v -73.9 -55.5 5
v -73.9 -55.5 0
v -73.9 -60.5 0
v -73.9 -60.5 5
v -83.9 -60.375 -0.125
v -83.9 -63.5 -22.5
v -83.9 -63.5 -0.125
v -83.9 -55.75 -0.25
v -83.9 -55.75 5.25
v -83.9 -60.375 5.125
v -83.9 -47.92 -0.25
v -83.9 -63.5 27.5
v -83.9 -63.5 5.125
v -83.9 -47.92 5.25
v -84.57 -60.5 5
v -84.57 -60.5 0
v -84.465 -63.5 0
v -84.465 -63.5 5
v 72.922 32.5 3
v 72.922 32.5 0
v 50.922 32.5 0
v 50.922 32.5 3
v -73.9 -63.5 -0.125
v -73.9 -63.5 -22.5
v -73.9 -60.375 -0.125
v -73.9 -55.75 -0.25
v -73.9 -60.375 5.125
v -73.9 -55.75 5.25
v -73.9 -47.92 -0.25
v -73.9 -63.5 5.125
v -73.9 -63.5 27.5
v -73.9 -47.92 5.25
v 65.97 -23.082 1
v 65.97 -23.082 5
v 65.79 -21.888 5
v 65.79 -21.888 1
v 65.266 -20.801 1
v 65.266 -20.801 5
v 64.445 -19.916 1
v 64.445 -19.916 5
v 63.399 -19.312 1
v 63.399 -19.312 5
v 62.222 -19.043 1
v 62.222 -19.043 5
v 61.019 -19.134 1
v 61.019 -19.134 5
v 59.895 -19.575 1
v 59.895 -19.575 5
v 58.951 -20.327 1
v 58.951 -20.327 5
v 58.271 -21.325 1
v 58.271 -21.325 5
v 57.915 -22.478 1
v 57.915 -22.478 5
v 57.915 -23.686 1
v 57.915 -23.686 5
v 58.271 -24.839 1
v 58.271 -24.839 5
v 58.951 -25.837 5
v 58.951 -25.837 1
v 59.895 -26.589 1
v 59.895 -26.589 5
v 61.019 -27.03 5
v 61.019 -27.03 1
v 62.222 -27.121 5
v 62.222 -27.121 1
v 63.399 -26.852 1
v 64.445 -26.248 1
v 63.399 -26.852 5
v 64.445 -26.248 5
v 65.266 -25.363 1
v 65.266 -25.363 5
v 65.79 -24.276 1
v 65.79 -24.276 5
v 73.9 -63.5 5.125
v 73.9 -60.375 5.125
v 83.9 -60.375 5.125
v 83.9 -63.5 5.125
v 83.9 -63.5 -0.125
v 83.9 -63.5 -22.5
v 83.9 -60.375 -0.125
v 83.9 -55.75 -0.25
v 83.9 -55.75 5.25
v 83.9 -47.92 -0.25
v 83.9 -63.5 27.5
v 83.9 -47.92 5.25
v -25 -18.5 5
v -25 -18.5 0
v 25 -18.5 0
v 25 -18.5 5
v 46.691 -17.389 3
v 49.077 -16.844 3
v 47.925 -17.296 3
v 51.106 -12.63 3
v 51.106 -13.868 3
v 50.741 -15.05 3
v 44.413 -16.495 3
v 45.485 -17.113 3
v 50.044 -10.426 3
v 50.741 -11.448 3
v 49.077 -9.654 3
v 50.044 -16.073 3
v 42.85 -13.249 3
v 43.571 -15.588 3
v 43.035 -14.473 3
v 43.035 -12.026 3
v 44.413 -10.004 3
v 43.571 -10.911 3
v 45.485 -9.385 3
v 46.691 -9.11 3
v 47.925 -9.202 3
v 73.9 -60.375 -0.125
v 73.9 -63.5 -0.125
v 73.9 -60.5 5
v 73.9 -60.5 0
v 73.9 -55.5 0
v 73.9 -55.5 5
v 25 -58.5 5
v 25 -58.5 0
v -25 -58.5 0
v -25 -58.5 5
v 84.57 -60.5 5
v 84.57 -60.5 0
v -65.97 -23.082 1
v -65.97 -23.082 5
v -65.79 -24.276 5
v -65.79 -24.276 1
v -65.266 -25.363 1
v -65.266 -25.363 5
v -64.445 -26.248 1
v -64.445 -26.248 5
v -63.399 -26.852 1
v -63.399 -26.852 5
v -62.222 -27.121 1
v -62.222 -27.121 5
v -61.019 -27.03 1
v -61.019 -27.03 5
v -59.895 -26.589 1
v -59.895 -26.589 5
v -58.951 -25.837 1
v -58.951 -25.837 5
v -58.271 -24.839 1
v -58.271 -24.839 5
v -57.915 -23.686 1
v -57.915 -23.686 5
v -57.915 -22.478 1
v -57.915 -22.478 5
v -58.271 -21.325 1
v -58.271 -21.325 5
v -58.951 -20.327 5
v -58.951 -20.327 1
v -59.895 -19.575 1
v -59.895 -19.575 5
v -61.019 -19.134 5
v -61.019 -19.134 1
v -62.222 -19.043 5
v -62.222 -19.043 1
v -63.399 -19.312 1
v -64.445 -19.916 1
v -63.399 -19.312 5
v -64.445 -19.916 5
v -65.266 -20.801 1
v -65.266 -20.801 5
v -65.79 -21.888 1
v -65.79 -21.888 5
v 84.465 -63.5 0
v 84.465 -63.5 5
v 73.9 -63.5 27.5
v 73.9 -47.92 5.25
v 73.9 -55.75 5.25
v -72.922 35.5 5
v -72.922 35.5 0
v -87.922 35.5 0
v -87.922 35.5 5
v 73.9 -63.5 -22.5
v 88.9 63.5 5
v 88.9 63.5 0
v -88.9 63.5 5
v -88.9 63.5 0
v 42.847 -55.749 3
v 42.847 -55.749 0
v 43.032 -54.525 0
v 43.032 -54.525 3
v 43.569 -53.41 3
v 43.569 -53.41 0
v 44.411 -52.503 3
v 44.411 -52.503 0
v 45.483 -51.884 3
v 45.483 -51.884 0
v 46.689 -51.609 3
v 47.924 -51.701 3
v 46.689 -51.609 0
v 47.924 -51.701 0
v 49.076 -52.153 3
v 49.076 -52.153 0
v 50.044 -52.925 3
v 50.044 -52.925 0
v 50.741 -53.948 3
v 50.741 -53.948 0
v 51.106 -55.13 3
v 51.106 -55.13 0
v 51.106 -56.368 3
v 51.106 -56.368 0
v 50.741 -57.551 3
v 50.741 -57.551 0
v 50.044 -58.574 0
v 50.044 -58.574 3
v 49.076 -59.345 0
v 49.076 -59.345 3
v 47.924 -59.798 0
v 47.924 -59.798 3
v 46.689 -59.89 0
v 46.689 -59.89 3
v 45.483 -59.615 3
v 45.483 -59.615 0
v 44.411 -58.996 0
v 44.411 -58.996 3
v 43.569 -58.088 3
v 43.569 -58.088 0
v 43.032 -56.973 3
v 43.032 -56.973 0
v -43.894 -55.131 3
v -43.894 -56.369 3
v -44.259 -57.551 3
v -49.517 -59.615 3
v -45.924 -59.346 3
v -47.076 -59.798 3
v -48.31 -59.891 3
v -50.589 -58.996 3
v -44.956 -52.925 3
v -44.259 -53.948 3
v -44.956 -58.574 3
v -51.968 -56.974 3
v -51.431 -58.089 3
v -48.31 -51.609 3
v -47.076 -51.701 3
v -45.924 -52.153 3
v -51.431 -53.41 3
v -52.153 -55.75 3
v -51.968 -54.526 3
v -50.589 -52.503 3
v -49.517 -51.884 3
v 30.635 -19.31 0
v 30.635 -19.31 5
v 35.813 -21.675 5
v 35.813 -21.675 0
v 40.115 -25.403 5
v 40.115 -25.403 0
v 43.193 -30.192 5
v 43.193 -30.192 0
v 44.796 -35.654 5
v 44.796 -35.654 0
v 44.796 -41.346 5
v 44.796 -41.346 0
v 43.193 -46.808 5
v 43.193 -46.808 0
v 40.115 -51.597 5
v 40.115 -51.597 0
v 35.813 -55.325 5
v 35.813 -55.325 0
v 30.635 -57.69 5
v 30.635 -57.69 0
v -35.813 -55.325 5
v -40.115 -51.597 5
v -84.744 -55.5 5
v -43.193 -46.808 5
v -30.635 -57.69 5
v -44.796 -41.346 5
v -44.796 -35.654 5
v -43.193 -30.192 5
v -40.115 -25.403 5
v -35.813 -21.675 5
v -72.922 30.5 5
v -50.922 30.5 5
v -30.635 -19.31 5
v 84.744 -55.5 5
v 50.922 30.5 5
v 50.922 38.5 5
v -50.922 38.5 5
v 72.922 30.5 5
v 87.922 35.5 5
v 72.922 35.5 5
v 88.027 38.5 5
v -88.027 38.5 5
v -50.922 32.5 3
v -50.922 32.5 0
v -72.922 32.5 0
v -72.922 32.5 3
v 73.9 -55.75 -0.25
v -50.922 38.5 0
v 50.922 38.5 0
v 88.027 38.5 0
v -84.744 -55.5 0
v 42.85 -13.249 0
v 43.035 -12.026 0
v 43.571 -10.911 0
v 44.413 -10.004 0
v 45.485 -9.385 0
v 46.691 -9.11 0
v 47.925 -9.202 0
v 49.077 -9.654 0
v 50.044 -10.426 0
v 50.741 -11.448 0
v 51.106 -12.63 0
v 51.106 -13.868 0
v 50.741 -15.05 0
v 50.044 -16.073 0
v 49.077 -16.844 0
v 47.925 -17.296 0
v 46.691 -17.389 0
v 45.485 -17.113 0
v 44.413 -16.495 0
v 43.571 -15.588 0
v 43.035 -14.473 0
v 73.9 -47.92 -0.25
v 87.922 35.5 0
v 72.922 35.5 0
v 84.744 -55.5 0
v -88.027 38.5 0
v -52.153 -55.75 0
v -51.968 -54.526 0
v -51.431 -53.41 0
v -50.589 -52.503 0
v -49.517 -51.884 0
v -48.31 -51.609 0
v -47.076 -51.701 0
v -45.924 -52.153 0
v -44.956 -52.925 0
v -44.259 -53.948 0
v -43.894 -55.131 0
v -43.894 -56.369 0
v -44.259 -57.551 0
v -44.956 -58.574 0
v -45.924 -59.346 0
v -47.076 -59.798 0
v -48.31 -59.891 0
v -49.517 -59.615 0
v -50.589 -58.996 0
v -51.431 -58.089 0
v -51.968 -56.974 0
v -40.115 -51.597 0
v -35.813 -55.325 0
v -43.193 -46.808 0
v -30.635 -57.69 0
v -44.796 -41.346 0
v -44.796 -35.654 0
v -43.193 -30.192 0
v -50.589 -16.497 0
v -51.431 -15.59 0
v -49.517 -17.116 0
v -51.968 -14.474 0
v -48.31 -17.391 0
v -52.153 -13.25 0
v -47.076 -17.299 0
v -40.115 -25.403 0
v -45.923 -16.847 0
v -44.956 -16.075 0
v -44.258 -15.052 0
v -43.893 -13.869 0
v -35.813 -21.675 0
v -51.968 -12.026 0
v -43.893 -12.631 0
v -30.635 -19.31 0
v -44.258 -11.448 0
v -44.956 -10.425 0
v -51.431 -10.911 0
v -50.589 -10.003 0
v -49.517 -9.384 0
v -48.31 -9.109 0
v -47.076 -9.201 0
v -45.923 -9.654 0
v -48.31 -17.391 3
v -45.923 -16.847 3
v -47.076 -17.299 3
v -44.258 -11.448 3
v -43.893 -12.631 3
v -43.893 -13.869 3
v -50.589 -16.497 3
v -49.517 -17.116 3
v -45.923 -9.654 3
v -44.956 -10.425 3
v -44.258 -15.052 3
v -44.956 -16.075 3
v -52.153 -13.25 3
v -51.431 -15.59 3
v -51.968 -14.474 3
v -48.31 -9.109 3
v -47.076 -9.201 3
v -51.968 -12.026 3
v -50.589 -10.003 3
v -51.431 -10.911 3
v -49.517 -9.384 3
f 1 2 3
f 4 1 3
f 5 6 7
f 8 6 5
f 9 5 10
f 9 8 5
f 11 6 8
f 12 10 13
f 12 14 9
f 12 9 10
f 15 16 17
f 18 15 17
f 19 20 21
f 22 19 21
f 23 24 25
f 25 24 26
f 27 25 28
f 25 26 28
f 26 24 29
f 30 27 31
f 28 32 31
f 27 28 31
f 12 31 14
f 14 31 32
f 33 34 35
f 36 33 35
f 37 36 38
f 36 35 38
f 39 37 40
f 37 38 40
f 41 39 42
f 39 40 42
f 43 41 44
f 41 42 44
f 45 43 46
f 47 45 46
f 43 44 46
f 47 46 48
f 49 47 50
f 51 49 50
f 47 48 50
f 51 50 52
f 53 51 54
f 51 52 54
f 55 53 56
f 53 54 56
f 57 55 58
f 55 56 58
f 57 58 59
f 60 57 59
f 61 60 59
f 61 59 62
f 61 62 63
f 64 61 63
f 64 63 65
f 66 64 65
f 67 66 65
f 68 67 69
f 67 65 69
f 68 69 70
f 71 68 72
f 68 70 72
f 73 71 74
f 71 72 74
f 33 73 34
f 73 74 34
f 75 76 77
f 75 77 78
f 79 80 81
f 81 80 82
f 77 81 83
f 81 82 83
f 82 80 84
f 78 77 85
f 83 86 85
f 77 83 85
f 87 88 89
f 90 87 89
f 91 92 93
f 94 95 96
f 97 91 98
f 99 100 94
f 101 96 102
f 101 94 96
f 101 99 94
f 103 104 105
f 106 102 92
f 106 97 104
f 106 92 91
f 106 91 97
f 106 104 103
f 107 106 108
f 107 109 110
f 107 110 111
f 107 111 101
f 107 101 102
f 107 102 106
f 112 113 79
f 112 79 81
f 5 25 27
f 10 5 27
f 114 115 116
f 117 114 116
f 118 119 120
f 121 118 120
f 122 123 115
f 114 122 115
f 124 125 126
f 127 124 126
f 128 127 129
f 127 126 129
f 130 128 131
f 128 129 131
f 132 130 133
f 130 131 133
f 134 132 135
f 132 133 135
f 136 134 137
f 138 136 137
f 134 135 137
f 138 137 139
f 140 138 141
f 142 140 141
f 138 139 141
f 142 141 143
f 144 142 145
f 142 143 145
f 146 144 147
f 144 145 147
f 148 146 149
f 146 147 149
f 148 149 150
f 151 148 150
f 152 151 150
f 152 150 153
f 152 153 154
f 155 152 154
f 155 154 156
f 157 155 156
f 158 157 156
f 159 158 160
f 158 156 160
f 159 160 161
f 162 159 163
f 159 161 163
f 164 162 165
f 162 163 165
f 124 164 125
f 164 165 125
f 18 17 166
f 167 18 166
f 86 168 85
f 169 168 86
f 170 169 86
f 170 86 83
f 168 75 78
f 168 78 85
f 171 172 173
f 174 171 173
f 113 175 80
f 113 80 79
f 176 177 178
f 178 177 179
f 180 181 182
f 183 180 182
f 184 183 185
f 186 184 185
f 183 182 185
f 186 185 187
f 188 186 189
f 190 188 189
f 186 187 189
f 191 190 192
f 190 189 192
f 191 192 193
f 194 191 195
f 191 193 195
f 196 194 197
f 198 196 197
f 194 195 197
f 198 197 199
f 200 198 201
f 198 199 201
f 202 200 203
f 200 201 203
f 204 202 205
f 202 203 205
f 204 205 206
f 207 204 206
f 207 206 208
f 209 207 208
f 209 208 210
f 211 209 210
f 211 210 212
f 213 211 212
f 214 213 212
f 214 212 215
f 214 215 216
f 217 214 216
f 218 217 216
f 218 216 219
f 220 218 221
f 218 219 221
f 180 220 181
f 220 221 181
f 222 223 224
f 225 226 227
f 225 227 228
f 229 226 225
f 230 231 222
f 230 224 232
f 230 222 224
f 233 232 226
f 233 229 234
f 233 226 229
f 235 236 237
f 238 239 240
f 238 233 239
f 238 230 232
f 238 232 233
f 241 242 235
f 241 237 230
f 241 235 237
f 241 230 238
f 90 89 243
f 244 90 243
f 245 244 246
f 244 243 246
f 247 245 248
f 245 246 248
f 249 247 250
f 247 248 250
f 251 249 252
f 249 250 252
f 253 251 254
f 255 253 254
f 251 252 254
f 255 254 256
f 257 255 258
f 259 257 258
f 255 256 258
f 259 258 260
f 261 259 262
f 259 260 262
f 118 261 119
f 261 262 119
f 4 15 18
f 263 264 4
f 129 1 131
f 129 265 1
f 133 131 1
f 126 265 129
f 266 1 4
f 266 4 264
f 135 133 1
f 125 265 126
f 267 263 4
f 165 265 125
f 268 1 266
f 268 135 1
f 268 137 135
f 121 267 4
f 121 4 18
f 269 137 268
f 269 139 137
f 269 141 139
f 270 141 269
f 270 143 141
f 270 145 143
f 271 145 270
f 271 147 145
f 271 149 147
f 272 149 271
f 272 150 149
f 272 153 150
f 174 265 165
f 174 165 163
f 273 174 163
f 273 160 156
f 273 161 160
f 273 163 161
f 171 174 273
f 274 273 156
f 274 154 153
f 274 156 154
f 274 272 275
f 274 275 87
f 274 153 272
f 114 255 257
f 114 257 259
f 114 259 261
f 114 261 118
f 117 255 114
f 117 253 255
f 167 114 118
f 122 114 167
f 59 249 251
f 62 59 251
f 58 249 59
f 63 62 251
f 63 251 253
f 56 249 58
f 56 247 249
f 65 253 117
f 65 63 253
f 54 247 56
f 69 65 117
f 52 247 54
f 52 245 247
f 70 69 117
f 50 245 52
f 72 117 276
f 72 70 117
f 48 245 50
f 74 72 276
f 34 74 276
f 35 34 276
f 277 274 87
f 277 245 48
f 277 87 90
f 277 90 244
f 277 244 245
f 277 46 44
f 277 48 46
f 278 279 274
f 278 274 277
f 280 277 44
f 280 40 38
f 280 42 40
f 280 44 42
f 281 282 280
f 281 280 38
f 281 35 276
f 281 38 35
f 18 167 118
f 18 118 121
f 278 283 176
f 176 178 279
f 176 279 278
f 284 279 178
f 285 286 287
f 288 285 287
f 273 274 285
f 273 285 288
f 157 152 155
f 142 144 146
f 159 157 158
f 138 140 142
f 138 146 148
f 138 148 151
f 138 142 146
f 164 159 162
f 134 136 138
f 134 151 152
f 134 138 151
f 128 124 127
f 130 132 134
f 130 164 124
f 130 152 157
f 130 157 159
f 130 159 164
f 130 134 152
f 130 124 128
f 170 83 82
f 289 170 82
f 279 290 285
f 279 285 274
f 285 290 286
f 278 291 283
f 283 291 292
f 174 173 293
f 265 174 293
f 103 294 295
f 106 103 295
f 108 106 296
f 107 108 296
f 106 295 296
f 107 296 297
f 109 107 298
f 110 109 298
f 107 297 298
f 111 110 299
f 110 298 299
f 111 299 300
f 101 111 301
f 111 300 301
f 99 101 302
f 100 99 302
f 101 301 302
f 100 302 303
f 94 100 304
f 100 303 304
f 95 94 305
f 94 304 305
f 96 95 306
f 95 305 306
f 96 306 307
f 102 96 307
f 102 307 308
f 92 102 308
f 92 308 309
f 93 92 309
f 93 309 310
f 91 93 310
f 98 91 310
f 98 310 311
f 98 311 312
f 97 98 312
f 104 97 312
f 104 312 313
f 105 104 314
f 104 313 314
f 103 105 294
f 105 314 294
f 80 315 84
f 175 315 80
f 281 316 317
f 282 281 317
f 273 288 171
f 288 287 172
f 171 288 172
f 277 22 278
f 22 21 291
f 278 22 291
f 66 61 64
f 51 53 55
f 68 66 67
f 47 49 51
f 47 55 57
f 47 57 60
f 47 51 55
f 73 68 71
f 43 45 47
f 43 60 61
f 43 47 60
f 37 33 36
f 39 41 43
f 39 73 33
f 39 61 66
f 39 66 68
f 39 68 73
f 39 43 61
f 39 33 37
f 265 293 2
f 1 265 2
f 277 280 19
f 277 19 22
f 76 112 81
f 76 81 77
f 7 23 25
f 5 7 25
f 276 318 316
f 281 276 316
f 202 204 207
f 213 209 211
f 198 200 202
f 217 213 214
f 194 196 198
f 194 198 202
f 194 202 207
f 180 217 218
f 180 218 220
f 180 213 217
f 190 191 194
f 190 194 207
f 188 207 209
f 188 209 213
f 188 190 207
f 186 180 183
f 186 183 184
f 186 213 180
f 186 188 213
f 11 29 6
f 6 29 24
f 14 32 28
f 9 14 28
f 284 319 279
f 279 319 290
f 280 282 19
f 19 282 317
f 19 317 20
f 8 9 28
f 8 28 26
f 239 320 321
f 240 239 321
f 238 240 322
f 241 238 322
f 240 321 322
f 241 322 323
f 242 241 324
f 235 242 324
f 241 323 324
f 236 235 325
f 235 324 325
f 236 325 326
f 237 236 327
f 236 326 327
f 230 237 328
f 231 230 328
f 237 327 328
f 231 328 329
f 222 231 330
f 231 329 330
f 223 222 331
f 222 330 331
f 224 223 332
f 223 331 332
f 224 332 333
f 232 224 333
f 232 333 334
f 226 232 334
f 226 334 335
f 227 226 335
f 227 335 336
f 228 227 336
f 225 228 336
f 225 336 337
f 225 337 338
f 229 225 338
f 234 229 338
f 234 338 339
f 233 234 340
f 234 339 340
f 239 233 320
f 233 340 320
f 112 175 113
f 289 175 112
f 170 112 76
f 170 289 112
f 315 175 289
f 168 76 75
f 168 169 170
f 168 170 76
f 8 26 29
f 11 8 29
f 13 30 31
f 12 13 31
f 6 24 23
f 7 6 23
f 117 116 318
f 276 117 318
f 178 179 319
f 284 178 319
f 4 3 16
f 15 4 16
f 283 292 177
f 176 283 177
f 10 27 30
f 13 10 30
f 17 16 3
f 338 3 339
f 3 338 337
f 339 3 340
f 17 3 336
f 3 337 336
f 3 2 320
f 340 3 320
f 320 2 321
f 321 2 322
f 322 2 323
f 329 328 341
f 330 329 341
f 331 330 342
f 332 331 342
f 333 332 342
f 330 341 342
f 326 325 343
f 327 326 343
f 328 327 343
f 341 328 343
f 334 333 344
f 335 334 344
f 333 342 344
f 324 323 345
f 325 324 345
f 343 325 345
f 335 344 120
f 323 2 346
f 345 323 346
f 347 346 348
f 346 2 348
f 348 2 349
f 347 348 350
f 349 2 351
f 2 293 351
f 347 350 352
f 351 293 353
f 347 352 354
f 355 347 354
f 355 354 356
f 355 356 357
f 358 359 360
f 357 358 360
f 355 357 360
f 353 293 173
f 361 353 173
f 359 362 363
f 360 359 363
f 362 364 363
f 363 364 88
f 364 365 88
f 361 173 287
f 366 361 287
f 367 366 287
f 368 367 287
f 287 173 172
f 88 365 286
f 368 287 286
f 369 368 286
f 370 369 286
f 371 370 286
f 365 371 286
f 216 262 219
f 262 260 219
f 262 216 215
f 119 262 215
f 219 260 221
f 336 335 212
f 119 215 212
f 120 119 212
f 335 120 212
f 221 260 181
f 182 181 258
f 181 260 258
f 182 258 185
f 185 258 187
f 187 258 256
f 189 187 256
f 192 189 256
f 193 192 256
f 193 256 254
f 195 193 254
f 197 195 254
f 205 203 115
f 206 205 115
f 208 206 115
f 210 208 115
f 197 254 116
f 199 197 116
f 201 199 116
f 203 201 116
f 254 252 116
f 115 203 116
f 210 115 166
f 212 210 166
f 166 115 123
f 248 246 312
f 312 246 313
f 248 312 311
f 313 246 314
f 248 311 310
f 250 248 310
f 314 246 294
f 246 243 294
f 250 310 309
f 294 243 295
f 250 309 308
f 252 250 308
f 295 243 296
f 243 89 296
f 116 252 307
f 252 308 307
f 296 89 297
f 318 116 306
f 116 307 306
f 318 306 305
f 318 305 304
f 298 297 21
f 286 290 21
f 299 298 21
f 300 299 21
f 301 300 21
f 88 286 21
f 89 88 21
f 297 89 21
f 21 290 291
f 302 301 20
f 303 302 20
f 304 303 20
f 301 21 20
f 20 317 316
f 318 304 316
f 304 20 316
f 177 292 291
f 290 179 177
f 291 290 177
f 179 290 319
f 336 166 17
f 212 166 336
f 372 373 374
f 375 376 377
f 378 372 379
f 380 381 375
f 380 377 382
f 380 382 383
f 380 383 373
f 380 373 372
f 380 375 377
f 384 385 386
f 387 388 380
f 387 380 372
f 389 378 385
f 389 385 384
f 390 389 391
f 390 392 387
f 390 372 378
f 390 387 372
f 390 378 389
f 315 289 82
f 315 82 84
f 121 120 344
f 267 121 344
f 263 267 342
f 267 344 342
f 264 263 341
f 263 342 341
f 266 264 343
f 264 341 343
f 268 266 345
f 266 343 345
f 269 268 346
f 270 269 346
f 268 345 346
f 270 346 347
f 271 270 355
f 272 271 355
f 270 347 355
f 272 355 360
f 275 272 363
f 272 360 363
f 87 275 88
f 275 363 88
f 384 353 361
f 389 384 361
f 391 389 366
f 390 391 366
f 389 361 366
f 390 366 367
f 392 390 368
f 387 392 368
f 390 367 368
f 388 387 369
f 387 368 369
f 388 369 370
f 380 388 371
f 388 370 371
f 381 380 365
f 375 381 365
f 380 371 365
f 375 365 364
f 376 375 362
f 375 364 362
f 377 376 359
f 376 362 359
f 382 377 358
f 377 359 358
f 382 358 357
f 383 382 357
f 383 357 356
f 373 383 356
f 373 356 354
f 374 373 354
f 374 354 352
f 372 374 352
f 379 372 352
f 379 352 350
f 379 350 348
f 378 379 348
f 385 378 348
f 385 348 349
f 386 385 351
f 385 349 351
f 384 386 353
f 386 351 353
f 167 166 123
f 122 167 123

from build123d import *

# Parameters (mm, degrees)
BOSS_EXTRUDE1_DEPTH = 5
CHAMFER1_SIZE       = 2
BOSS_EXTRUDE4_DEPTH = 5
SKETCH2_R           = 4.05
CUT_EXTRUDE2_DEPTH  = 4
BOSS_EXTRUDE2_DEPTH = 10
BOSS_EXTRUDE3_START = -147.8
BOSS_EXTRUDE3_DEPTH = 10
SKETCH4_R           = 4.152826732
SKETCH4_R_2         = 4.151190034
SKETCH4_R_3         = 4.152320734
SKETCH4_R_4         = 4.152602902
CUT_EXTRUDE3_DEPTH  = 3


# Read off the part's stored shape, not the designer's step: Boss-Extrude1, Boss-Extrude4
with BuildPart() as part:
    # Boss-Extrude1 outline → Boss-Extrude1 (new body)
    with BuildSketch(Plane.XY):
        Polygon((-88.9, 63.5), (-88.026980763, 38.5), (-50.922218454, 38.5), (-50.922218454, 32.5), (-72.922218454, 32.5), (-72.922218454, 35.5), (-87.922218454, 35.5), (-84.74442843, -55.5), (-73.9, -55.5), (-73.9, -63.5), (73.9, -63.5), (73.9, -55.5), (84.74442843, -55.5), (87.922218454, 35.5), (72.922218454, 35.5), (72.922218454, 32.5), (50.922218454, 32.5), (50.922218454, 38.5), (88.026980763, 38.5), (88.9, 63.5), align=None)
        with BuildLine():
            Line((-25, -18.5), (25, -18.5))
            ThreePointArc((25, -18.5), (45, -38.5), (25, -58.5))
            Line((25, -58.5), (-25, -58.5))
            ThreePointArc((-25, -58.5), (-45, -38.5), (-25, -18.5))
        make_face(mode=Mode.SUBTRACT)
    extrude(amount=BOSS_EXTRUDE1_DEPTH)

    # Chamfer1
    chamfer1_edges = [part.edges().sort_by_distance(p)[0] for p in [
        (61.922218454, 32.5, 5),
        (-61.922218454, 32.5, 5),
    ]]
    chamfer(chamfer1_edges, length=CHAMFER1_SIZE)

    # Boss-Extrude4 outline → Boss-Extrude4 (add)
    with BuildSketch(Plane.XY):
        Polygon((73.9, -60.5), (73.9, -63.5), (84.465062275, -63.5), (84.569824583, -60.5), align=None)
        Polygon((-84.569824583, -60.5), (-84.465062275, -63.5), (-73.9, -63.5), (-73.9, -60.5), align=None)
    extrude(amount=BOSS_EXTRUDE4_DEPTH)

    # Sketch2 → Cut-Extrude2 (cut)
    with BuildSketch(Plane.XY.offset(5)):
        with Locations((61.919723642, -23.082003832)):
            Circle(SKETCH2_R)
        with Locations(Location((-61.919723642, -23.082003832, 0), (0, 0, 180))):
            Circle(SKETCH2_R)
    extrude(amount=-CUT_EXTRUDE2_DEPTH, mode=Mode.SUBTRACT)

    # Sketch4 → Cut-Extrude3 (cut)
    with BuildSketch(Plane(origin=(0, 0, 0), x_dir=(-1, 0, 0), z_dir=(0, 0, -1))):
        with Locations((47.999909157, -13.250133675)):
            Circle(SKETCH4_R)
        with Locations((-47.001300636, -13.249189401)):
            Circle(SKETCH4_R_2)
        with Locations((-46.999683563, -55.749320844)):
            Circle(SKETCH4_R_3)
        with Locations((47.999996185, -55.749608673)):
            Circle(SKETCH4_R_4)
    extrude(amount=-CUT_EXTRUDE3_DEPTH, mode=Mode.SUBTRACT)


with BuildPart() as body_2:
    # Sketch3 → Boss-Extrude2 (new body)
    with BuildSketch(Plane.ZY.offset(73.9)):
        Polygon((-22.5, -63.5), (-0.125, -63.5), (-0.125, -60.375), (5.125, -60.375), (5.125, -63.5), (27.5, -63.5), (5.25, -47.920382275), (5.25, -55.75), (-0.25, -55.75), (-0.25, -47.920382275), align=None)
    extrude(amount=BOSS_EXTRUDE2_DEPTH)


with BuildPart() as body_3:
    # Sketch3<2> → Boss-Extrude3 (new body)
    with BuildSketch(Plane.ZY.offset(73.9).offset(BOSS_EXTRUDE3_START)):
        Polygon((-22.5, -63.5), (-0.125, -63.5), (-0.125, -60.375), (5.125, -60.375), (5.125, -63.5), (27.5, -63.5), (5.25, -47.920382275), (5.25, -55.75), (-0.25, -55.75), (-0.25, -47.920382275), align=None)
    extrude(amount=-BOSS_EXTRUDE3_DEPTH)


solid = Compound([part.part, body_2.part, body_3.part])
